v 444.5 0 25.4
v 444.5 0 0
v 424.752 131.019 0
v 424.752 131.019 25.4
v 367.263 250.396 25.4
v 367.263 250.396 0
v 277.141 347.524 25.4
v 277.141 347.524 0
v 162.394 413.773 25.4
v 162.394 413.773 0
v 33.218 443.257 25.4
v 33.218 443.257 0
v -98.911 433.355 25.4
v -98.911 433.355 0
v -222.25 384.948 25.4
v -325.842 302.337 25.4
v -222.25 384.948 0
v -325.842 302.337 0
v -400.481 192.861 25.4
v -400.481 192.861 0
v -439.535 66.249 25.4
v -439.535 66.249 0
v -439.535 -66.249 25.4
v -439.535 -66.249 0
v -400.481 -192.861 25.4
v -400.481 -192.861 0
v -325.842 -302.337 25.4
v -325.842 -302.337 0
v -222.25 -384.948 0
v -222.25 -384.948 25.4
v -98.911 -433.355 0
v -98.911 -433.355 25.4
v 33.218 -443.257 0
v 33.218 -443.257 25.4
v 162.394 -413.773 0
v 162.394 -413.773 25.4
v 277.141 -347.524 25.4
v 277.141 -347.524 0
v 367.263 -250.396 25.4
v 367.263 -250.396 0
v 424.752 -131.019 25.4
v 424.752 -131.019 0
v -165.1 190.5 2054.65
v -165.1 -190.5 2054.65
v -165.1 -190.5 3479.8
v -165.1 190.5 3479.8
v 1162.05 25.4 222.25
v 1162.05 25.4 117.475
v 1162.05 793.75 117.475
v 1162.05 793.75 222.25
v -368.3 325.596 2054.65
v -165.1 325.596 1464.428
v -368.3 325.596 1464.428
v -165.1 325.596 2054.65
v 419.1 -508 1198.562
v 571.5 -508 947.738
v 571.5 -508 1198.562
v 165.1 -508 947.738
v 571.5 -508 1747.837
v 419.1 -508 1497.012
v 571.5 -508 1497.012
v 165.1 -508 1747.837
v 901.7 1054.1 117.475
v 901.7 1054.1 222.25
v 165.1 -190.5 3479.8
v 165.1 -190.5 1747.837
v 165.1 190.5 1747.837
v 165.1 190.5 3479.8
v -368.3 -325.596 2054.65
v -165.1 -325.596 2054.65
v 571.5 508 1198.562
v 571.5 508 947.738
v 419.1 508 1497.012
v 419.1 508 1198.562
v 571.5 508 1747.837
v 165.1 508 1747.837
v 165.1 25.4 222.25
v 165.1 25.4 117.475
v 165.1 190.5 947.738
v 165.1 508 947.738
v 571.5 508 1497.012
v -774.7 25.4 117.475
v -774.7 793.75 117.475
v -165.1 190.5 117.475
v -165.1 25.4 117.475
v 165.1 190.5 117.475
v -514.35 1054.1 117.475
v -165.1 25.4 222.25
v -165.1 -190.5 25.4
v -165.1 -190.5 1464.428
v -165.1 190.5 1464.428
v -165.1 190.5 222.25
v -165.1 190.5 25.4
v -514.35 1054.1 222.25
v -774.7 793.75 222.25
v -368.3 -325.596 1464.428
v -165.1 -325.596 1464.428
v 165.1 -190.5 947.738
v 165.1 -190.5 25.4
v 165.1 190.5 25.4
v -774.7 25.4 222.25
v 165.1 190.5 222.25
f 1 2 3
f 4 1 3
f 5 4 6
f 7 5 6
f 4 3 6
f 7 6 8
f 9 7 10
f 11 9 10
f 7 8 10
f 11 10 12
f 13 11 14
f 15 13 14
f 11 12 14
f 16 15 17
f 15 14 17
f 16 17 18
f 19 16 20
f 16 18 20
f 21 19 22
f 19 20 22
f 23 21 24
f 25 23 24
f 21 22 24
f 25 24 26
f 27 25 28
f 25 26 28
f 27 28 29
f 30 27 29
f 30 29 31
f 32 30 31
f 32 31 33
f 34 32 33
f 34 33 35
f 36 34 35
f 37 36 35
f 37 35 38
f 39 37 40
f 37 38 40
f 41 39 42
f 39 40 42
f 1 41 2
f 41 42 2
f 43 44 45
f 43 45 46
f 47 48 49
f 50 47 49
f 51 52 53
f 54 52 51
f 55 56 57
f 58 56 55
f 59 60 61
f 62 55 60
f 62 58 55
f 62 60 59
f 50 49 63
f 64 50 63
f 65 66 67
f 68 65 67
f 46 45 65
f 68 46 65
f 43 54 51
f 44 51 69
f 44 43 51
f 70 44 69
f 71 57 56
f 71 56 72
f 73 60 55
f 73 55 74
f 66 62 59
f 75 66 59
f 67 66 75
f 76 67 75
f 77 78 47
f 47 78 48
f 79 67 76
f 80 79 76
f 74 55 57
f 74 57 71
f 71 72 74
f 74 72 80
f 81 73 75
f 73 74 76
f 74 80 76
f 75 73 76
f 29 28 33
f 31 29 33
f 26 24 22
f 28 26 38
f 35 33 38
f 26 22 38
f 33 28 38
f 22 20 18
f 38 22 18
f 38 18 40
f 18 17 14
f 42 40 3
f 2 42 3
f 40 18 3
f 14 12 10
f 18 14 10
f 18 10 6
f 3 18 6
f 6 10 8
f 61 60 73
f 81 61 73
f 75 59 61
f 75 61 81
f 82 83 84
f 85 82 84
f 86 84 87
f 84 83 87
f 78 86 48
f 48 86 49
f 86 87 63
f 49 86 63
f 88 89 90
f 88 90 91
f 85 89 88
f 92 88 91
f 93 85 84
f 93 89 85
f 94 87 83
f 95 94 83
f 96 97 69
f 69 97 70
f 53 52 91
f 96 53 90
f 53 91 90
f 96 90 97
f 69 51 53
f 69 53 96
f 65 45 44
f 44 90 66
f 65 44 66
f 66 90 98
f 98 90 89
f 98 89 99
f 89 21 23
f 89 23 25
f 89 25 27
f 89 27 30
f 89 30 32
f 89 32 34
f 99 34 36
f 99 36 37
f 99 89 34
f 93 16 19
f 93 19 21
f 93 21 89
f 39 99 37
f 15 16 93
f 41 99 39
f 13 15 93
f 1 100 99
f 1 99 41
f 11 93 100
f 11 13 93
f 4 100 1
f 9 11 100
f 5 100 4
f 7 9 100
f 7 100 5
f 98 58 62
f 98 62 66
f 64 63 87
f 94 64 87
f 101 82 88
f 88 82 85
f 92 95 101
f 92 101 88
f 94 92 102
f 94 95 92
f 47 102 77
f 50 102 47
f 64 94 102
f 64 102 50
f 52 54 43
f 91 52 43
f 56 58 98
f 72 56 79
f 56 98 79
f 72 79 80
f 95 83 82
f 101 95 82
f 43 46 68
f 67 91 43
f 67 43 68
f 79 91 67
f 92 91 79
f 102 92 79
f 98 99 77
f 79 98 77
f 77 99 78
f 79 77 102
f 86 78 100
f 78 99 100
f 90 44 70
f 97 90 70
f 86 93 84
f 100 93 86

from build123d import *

# Parameters (mm, degrees)
F0_R      = 444.5
F1_DEPTH  = 25.4
F2_W      = 330.2
F2_H      = 381
F3_DEPTH  = 3454.4
F6_DEPTH  = 104.775
F7_W      = 381
F7_H      = 800.1
F7_W_2    = 317.5
F8_DEPTH  = 254
F9_W      = 1016
F9_H      = 250.825
F10_DEPTH = 152.4
F11_W     = 651.1913537979
F11_H     = 590.2225971222
F12_DEPTH = 203.2


with BuildPart() as f1:
    # F0 (on Top) → F1 (new body)
    with BuildSketch(Plane.XY):
        Circle(F0_R)
    extrude(amount=F1_DEPTH)

    # F2 (on face) → F3 (join)
    with BuildSketch(Plane.XY.offset(25.4)):
        Rectangle(F2_W, F2_H)
    extrude(amount=F3_DEPTH)

    # F5 (on offset) → F6 (join)
    with BuildSketch(Plane.XY.offset(117.475)):
        Polygon((-774.7, 25.4), (0, 25.4), (1162.05, 25.4), (1162.05, 793.75), (901.7, 793.75), (901.7, 1054.1), (-514.35, 1054.1), (-514.35, 793.75), (-774.7, 793.75), align=None)
        Polygon((901.7, 793.75), (1162.05, 793.75), (901.7, 1054.1), align=None)
        Polygon((-514.35, 1054.1), (-774.7, 793.75), (-514.35, 793.75), align=None)
    extrude(amount=F6_DEPTH)

    # F7 (on face) → F8 (join)
    with BuildSketch(Plane.YZ.offset(165.1)):
        with Locations((0, 1347.7875)):
            Rectangle(F7_W, F7_H)
        with Locations((-349.25, 1347.7875)):
            Rectangle(F7_W_2, F7_H)
        with Locations((349.25, 1347.7875)):
            Rectangle(F7_W_2, F7_H)
    extrude(amount=F8_DEPTH)

    # F9 (on face) → F10 (join)
    with BuildSketch(Plane.YZ.offset(419.1)):
        with Locations((0, 1622.425)):
            Rectangle(F9_W, F9_H)
        with Locations((0, 1073.15)):
            Rectangle(F9_W, F9_H)
    extrude(amount=F10_DEPTH)

    # F11 (on face) → F12 (join)
    with BuildSketch(Plane(origin=(-165.1, 0, 0), x_dir=(0, -1, 0), z_dir=(-1, 0, 0))):
        with Locations((0, 1759.5391273499)):
            Rectangle(F11_W, F11_H)
    extrude(amount=F12_DEPTH)


solid = f1.part
